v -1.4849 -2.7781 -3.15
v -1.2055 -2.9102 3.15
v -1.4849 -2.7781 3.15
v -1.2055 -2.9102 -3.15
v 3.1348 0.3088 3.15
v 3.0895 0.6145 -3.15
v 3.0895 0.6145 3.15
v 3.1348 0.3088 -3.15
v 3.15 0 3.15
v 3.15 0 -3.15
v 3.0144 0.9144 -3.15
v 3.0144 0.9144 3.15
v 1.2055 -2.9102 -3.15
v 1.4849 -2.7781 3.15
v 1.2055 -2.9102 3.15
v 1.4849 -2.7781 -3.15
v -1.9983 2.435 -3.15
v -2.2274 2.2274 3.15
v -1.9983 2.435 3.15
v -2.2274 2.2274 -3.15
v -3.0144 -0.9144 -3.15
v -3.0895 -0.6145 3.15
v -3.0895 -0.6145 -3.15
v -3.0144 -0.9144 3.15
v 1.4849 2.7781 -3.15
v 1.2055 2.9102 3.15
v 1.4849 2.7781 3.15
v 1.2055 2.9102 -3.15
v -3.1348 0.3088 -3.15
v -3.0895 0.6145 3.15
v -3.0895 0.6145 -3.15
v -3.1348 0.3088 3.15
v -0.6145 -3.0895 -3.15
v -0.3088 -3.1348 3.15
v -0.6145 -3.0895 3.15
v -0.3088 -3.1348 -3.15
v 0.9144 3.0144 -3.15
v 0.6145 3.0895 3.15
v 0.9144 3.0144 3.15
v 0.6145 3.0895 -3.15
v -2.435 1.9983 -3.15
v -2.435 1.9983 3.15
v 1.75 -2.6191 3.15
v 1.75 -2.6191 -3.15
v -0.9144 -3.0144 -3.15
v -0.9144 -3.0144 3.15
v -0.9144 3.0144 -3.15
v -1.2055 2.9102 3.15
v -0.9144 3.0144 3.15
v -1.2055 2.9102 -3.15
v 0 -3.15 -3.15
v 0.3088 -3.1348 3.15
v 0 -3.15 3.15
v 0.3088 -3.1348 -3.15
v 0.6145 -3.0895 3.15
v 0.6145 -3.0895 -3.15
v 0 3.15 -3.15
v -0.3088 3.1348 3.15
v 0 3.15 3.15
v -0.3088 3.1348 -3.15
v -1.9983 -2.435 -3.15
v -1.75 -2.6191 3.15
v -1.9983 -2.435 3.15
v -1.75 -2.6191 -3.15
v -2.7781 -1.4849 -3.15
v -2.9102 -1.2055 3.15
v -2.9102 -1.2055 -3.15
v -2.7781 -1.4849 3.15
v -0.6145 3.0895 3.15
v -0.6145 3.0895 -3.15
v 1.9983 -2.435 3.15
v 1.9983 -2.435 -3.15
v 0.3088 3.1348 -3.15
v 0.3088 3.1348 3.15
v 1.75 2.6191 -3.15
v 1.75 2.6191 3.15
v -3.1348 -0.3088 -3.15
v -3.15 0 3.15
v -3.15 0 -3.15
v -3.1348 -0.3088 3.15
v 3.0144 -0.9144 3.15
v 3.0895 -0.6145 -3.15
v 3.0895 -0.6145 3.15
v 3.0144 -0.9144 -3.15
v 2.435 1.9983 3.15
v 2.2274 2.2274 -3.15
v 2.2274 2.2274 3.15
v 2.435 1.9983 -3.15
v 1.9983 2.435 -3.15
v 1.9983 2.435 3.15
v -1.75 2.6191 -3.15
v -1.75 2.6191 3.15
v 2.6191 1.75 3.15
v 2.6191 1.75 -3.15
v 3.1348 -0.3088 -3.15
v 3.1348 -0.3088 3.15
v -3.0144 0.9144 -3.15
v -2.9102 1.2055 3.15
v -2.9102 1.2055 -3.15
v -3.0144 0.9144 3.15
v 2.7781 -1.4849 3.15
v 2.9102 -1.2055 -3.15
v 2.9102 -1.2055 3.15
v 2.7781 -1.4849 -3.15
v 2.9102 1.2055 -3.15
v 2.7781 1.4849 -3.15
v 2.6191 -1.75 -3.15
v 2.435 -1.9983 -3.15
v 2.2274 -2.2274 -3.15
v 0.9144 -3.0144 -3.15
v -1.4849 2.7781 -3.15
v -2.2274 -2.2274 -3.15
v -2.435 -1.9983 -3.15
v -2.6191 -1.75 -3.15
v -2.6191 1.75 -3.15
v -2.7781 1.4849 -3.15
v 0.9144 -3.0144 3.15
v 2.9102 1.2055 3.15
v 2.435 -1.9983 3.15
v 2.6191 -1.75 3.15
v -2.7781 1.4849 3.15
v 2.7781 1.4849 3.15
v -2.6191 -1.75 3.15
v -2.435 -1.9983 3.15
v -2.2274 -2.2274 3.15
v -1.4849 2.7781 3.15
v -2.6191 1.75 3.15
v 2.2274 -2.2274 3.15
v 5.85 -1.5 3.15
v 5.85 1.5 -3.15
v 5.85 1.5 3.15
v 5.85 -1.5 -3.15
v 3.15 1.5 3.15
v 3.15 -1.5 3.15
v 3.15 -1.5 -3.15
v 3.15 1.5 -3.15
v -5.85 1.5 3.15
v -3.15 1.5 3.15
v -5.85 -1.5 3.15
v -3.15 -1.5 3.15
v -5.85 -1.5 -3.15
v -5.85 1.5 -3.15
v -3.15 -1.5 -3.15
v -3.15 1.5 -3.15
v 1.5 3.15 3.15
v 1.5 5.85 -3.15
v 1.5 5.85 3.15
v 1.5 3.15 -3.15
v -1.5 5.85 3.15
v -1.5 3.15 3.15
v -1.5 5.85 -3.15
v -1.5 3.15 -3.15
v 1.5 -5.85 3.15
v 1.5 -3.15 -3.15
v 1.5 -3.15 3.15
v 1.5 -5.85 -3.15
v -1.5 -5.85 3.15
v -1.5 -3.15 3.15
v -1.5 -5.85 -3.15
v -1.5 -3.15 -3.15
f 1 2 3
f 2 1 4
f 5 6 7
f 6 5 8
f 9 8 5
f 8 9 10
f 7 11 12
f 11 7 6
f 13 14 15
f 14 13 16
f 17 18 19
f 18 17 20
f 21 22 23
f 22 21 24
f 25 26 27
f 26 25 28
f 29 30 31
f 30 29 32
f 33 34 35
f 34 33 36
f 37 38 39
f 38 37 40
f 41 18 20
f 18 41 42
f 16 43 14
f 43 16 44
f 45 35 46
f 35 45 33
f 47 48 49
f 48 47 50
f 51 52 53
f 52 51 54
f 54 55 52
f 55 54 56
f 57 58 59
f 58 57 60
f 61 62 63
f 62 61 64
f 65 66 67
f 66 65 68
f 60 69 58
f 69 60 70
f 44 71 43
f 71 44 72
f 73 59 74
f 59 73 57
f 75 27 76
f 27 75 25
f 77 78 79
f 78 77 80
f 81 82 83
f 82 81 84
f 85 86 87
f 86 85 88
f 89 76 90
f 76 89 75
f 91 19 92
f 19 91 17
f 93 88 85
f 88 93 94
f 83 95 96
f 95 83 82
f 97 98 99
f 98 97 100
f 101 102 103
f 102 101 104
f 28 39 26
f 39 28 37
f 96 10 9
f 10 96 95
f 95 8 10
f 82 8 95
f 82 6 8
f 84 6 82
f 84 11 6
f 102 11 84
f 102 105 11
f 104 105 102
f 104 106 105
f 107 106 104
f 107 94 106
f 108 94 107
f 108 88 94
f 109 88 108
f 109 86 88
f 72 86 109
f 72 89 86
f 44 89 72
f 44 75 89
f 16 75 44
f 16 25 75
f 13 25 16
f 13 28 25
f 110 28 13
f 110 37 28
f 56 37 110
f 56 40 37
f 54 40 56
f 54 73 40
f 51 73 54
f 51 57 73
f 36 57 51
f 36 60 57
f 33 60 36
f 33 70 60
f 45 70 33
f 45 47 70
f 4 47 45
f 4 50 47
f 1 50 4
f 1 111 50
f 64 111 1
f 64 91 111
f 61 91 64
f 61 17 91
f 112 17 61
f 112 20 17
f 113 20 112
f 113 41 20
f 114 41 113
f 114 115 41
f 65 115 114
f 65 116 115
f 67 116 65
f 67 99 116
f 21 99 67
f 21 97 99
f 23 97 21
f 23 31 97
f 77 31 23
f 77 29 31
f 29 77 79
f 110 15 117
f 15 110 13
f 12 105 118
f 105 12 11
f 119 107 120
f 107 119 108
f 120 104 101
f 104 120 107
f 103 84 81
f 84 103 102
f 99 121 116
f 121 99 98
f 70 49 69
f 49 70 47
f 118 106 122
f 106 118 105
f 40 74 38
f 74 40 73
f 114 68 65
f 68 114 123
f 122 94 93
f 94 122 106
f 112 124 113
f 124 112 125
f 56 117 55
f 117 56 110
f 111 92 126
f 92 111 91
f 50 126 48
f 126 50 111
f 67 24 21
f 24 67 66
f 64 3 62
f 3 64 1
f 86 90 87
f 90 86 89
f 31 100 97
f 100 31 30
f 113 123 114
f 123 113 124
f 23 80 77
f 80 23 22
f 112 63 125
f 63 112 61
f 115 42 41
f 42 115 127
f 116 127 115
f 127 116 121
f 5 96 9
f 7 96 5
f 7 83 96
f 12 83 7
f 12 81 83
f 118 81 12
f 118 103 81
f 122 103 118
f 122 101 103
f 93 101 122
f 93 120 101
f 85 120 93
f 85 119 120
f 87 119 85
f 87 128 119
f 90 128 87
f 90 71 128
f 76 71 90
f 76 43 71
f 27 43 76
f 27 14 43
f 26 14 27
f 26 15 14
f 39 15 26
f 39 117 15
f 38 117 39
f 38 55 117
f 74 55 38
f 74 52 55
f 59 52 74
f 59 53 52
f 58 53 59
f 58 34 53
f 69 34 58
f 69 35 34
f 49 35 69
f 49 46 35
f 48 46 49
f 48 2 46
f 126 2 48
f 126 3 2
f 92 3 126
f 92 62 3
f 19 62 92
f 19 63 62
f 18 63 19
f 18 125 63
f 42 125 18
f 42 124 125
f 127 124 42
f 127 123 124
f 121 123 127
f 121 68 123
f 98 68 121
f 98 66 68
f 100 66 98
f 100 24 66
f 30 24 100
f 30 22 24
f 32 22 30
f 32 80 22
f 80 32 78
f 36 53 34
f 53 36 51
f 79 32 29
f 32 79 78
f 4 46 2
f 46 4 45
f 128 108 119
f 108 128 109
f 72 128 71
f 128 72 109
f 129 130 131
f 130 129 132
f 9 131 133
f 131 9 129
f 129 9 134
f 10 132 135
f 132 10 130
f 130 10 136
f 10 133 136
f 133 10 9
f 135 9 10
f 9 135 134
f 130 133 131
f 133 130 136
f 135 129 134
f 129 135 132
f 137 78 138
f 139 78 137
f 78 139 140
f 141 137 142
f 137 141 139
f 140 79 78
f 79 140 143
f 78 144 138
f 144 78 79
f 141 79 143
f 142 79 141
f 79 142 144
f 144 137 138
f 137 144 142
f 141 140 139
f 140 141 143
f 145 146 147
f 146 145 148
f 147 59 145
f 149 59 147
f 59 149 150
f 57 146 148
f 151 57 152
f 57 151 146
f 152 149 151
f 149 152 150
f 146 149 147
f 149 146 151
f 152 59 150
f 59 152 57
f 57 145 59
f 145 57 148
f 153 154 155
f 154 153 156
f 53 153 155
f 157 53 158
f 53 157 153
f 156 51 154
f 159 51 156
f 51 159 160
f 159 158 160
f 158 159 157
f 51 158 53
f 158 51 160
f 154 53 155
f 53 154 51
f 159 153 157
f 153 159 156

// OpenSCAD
$fn=64;

bbox_xy = 11.7;
bbox_z  = 6.3;

core_d = 6.3;
core_h = bbox_z;

tab_len = (bbox_xy - core_d)/2;
tab_w   = 3.0;
tab_h   = core_h;

module tab_x() {
    translate([core_d/2, -tab_w/2, -tab_h/2])
        cube([tab_len, tab_w, tab_h], center=false);
}

module tab_y() {
    translate([-tab_w/2, core_d/2, -tab_h/2])
        cube([tab_w, tab_len, tab_h], center=false);
}

module hub() {
    union() {
        cylinder(d=core_d, h=core_h, center=true);
        tab_x();
        mirror([1,0,0]) tab_x();
        tab_y();
        mirror([0,1,0]) tab_y();
    }
}

hub();
